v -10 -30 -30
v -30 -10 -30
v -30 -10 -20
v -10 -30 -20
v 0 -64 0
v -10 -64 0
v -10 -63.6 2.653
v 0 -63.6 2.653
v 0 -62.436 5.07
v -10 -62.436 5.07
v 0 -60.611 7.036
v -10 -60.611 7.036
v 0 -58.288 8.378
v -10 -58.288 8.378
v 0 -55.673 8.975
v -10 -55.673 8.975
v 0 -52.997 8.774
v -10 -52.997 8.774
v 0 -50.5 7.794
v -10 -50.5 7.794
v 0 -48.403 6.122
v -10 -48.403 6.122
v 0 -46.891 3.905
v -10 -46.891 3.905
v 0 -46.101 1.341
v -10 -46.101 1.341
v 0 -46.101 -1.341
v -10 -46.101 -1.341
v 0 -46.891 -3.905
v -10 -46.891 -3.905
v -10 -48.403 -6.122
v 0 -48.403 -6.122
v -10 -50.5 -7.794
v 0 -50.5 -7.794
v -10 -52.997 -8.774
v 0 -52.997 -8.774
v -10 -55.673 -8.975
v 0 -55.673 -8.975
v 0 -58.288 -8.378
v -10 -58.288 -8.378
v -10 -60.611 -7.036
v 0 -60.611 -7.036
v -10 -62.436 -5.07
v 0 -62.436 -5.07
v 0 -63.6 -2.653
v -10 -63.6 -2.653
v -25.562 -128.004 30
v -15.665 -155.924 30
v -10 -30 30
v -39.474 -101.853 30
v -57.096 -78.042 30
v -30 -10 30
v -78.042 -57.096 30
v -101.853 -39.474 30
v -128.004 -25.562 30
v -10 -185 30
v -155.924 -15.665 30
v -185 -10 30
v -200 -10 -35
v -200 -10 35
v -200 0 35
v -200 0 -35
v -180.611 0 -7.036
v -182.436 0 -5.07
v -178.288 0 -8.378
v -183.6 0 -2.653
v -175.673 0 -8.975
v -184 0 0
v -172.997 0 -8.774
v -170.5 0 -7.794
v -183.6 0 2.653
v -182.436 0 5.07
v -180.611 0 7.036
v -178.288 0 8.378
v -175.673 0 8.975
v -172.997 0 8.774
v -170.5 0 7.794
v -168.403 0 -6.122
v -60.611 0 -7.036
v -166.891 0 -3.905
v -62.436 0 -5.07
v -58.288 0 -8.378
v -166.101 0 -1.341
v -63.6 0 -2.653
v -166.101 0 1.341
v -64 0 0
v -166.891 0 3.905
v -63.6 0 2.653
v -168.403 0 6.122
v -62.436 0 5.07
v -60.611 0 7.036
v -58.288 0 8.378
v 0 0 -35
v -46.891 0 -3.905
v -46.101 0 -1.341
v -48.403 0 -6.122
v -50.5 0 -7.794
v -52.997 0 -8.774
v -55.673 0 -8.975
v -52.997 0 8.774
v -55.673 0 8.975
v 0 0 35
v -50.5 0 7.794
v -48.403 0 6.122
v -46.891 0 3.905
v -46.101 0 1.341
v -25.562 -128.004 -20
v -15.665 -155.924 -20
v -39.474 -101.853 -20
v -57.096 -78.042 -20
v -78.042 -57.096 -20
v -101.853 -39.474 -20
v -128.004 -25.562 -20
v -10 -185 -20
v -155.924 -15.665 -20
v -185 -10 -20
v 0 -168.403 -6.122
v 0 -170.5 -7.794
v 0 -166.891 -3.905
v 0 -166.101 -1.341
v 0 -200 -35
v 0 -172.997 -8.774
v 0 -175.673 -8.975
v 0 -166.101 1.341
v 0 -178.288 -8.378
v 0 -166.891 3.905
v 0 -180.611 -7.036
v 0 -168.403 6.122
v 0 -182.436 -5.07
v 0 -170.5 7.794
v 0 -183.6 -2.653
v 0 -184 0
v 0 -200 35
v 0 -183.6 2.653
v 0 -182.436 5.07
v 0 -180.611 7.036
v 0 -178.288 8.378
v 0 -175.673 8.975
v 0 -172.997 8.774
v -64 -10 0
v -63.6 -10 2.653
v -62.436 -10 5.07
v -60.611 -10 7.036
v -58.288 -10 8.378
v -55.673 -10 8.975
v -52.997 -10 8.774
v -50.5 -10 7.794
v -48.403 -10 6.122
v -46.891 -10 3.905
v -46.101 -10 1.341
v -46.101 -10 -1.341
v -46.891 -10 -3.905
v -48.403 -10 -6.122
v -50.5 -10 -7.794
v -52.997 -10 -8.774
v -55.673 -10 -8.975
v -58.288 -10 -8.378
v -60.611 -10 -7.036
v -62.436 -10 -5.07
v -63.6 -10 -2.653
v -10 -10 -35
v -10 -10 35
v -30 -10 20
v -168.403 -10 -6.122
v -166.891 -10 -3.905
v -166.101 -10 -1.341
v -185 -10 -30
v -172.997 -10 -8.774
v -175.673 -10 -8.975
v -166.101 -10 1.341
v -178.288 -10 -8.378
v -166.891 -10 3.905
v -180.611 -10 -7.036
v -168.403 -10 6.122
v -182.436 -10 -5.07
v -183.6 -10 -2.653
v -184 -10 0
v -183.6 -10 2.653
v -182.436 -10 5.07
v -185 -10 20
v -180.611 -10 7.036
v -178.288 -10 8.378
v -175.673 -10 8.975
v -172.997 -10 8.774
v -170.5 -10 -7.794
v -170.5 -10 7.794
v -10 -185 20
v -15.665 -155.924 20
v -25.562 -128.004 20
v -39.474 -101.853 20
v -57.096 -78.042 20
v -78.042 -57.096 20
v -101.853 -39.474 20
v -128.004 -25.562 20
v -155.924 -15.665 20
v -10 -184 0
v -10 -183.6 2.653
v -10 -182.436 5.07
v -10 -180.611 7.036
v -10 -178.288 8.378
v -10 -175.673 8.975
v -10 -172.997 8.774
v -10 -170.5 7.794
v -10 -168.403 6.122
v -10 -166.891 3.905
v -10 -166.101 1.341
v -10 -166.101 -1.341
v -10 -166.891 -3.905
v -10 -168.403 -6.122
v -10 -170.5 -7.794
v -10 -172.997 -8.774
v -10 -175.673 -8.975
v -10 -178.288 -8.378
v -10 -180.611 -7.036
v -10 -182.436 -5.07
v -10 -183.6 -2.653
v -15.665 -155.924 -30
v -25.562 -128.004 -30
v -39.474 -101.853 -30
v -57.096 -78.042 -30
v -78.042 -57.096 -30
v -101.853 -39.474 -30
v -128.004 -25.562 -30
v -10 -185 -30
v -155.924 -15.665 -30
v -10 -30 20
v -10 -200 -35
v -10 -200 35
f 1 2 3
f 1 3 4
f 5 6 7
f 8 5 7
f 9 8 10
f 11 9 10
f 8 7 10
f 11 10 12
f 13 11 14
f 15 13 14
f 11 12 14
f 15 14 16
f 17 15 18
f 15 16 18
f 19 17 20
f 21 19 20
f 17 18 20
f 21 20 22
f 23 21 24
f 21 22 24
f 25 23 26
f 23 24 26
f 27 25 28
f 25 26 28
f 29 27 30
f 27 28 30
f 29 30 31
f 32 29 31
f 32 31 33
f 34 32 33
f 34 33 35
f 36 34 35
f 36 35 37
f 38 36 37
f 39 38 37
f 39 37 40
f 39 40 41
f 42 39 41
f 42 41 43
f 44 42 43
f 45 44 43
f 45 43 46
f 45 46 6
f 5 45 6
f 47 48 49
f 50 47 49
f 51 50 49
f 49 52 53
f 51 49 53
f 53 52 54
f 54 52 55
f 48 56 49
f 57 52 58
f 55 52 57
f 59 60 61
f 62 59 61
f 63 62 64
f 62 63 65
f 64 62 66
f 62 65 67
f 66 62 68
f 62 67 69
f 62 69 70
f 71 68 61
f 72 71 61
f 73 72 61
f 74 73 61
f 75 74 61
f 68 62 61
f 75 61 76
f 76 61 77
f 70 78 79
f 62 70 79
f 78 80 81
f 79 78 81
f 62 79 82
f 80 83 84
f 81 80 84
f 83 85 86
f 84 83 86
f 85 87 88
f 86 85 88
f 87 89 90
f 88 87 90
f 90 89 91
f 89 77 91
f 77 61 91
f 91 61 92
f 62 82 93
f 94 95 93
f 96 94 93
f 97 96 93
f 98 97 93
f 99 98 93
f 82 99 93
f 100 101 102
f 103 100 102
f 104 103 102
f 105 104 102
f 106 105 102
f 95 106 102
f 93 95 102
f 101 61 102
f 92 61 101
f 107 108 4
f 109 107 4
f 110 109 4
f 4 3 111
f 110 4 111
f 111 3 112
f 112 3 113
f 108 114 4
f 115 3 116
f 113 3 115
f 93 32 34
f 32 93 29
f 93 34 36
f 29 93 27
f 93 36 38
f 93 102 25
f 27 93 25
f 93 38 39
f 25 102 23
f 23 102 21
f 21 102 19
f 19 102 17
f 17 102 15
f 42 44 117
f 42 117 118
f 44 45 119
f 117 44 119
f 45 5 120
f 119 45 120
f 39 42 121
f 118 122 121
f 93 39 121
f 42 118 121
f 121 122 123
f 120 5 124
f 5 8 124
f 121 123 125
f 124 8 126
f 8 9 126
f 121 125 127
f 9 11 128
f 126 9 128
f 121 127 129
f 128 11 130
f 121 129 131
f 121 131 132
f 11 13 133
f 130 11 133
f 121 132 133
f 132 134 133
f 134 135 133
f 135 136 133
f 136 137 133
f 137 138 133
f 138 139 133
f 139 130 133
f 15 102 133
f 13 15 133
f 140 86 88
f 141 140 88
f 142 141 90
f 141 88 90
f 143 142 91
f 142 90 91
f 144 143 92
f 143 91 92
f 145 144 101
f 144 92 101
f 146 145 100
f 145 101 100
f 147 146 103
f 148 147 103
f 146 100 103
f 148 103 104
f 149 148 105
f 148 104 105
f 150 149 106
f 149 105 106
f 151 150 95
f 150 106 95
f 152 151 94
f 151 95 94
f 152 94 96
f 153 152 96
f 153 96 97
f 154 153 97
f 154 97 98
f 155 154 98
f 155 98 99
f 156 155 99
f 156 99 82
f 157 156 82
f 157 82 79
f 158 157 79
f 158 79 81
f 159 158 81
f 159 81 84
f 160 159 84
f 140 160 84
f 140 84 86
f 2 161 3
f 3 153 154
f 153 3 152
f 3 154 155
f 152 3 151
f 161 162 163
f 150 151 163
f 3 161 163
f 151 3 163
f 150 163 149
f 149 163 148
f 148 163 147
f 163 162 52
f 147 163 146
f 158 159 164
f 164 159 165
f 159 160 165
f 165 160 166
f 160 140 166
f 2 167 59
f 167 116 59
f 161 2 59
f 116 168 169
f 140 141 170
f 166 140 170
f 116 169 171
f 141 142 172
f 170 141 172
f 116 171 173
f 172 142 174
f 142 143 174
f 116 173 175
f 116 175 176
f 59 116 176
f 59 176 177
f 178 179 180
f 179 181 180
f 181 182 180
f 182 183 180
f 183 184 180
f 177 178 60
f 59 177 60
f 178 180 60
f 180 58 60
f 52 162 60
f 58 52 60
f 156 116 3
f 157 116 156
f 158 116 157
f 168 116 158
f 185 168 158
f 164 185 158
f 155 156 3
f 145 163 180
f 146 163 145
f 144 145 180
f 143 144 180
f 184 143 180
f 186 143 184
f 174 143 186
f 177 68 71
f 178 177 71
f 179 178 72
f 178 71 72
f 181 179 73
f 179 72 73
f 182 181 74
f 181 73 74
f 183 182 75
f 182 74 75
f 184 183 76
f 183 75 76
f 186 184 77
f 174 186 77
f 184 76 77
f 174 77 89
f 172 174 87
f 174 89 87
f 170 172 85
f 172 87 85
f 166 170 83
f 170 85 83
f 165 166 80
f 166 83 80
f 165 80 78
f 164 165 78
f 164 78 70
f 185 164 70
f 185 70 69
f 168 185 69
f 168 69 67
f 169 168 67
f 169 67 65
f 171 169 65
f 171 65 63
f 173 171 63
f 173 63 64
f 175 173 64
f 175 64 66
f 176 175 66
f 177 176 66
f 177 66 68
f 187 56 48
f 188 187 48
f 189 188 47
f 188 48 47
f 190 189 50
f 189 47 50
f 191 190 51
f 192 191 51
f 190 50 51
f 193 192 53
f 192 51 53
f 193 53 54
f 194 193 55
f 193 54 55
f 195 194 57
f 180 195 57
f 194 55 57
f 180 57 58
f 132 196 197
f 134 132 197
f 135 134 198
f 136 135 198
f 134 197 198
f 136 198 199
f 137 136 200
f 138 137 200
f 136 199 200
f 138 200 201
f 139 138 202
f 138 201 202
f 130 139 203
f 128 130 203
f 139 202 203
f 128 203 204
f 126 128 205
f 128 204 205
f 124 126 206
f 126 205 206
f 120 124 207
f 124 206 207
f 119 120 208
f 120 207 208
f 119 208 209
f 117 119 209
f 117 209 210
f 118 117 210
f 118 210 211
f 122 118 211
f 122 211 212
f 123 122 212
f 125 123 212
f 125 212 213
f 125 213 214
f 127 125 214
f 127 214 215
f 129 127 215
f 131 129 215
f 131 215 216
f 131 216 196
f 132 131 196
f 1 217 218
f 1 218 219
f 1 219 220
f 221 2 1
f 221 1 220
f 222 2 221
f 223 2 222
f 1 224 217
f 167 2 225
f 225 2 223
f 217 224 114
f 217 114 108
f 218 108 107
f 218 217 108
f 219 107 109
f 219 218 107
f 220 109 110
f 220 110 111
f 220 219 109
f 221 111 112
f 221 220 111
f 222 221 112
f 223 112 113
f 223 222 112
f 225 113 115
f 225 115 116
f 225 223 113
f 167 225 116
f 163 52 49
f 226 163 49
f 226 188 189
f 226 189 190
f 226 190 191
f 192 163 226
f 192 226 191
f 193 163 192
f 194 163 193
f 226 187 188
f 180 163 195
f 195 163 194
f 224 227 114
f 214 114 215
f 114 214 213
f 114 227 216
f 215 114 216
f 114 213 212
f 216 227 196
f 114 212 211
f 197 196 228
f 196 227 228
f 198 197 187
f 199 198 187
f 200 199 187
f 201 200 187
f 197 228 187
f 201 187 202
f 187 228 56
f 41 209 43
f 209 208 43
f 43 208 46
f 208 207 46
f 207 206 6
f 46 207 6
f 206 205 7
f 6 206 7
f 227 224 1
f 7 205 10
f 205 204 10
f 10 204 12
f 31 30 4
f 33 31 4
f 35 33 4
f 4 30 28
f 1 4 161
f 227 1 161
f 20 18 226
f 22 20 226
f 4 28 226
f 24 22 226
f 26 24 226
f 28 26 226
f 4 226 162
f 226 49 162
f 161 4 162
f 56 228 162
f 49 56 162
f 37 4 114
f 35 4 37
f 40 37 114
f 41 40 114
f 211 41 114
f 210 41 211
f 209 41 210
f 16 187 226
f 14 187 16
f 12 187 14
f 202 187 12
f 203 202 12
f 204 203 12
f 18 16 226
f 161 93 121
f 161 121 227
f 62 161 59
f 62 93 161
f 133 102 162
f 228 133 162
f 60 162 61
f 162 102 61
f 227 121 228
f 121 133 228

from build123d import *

# Parameters (mm, degrees)
EXTRUDE_THIN1_DEPTH = 35
BOSS_EXTRUDE2_DEPTH = 10
SKETCH4_R           = 9
CUT_EXTRUDE1_DEPTH  = 279.07373123
CIRPATTERN1_COUNT   = 4


with BuildPart() as part:
    # Sketch2 → Extrude-Thin1 (new, symmetric)
    with BuildSketch(Plane.XY):
        Polygon((-200, 0), (0, 0), (0, -200), (-10, -200), (-10, -10), (-200, -10), align=None)
    extrude(amount=EXTRUDE_THIN1_DEPTH, both=True)

    # Sketch3 → Boss-Extrude2 (add)
    with BuildSketch(Plane(origin=(0, 0, -30), x_dir=(-1, 0, 0), z_dir=(0, 0, -1))):
        with BuildLine():
            Line((30, -10), (10, -30))
            Line((10, -30), (10, -185))
            ThreePointArc((10, -185), (67.181073979, -67.181073979), (185, -10))
            Line((185, -10), (30, -10))
        make_face()
    boss_extrude2 = extrude(amount=-BOSS_EXTRUDE2_DEPTH)

    # Mirror1: Boss-Extrude2 across plane
    add(boss_extrude2.mirror(Plane.XY))

    # Sketch4 → Cut-Extrude1 (cut, through all)
    with BuildSketch(Plane.ZY.offset(10)):
        with Locations(Location((0, -55, 0), (0, 0, 270))):
            Circle(SKETCH4_R)
        with Locations(Location((0, -175, 0), (0, 0, 270))):
            Circle(SKETCH4_R)
    cut_extrude1 = extrude(amount=-CUT_EXTRUDE1_DEPTH, mode=Mode.SUBTRACT)

    # CirPattern1: Cut-Extrude1 ×4 about axis
    cirpattern1_axis = Axis((0, 0, 35), (0, 0, -1))
    for i in range(1, CIRPATTERN1_COUNT):
        add(cut_extrude1.rotate(cirpattern1_axis, i * 360 / CIRPATTERN1_COUNT), mode=Mode.SUBTRACT)


solid = part.part
